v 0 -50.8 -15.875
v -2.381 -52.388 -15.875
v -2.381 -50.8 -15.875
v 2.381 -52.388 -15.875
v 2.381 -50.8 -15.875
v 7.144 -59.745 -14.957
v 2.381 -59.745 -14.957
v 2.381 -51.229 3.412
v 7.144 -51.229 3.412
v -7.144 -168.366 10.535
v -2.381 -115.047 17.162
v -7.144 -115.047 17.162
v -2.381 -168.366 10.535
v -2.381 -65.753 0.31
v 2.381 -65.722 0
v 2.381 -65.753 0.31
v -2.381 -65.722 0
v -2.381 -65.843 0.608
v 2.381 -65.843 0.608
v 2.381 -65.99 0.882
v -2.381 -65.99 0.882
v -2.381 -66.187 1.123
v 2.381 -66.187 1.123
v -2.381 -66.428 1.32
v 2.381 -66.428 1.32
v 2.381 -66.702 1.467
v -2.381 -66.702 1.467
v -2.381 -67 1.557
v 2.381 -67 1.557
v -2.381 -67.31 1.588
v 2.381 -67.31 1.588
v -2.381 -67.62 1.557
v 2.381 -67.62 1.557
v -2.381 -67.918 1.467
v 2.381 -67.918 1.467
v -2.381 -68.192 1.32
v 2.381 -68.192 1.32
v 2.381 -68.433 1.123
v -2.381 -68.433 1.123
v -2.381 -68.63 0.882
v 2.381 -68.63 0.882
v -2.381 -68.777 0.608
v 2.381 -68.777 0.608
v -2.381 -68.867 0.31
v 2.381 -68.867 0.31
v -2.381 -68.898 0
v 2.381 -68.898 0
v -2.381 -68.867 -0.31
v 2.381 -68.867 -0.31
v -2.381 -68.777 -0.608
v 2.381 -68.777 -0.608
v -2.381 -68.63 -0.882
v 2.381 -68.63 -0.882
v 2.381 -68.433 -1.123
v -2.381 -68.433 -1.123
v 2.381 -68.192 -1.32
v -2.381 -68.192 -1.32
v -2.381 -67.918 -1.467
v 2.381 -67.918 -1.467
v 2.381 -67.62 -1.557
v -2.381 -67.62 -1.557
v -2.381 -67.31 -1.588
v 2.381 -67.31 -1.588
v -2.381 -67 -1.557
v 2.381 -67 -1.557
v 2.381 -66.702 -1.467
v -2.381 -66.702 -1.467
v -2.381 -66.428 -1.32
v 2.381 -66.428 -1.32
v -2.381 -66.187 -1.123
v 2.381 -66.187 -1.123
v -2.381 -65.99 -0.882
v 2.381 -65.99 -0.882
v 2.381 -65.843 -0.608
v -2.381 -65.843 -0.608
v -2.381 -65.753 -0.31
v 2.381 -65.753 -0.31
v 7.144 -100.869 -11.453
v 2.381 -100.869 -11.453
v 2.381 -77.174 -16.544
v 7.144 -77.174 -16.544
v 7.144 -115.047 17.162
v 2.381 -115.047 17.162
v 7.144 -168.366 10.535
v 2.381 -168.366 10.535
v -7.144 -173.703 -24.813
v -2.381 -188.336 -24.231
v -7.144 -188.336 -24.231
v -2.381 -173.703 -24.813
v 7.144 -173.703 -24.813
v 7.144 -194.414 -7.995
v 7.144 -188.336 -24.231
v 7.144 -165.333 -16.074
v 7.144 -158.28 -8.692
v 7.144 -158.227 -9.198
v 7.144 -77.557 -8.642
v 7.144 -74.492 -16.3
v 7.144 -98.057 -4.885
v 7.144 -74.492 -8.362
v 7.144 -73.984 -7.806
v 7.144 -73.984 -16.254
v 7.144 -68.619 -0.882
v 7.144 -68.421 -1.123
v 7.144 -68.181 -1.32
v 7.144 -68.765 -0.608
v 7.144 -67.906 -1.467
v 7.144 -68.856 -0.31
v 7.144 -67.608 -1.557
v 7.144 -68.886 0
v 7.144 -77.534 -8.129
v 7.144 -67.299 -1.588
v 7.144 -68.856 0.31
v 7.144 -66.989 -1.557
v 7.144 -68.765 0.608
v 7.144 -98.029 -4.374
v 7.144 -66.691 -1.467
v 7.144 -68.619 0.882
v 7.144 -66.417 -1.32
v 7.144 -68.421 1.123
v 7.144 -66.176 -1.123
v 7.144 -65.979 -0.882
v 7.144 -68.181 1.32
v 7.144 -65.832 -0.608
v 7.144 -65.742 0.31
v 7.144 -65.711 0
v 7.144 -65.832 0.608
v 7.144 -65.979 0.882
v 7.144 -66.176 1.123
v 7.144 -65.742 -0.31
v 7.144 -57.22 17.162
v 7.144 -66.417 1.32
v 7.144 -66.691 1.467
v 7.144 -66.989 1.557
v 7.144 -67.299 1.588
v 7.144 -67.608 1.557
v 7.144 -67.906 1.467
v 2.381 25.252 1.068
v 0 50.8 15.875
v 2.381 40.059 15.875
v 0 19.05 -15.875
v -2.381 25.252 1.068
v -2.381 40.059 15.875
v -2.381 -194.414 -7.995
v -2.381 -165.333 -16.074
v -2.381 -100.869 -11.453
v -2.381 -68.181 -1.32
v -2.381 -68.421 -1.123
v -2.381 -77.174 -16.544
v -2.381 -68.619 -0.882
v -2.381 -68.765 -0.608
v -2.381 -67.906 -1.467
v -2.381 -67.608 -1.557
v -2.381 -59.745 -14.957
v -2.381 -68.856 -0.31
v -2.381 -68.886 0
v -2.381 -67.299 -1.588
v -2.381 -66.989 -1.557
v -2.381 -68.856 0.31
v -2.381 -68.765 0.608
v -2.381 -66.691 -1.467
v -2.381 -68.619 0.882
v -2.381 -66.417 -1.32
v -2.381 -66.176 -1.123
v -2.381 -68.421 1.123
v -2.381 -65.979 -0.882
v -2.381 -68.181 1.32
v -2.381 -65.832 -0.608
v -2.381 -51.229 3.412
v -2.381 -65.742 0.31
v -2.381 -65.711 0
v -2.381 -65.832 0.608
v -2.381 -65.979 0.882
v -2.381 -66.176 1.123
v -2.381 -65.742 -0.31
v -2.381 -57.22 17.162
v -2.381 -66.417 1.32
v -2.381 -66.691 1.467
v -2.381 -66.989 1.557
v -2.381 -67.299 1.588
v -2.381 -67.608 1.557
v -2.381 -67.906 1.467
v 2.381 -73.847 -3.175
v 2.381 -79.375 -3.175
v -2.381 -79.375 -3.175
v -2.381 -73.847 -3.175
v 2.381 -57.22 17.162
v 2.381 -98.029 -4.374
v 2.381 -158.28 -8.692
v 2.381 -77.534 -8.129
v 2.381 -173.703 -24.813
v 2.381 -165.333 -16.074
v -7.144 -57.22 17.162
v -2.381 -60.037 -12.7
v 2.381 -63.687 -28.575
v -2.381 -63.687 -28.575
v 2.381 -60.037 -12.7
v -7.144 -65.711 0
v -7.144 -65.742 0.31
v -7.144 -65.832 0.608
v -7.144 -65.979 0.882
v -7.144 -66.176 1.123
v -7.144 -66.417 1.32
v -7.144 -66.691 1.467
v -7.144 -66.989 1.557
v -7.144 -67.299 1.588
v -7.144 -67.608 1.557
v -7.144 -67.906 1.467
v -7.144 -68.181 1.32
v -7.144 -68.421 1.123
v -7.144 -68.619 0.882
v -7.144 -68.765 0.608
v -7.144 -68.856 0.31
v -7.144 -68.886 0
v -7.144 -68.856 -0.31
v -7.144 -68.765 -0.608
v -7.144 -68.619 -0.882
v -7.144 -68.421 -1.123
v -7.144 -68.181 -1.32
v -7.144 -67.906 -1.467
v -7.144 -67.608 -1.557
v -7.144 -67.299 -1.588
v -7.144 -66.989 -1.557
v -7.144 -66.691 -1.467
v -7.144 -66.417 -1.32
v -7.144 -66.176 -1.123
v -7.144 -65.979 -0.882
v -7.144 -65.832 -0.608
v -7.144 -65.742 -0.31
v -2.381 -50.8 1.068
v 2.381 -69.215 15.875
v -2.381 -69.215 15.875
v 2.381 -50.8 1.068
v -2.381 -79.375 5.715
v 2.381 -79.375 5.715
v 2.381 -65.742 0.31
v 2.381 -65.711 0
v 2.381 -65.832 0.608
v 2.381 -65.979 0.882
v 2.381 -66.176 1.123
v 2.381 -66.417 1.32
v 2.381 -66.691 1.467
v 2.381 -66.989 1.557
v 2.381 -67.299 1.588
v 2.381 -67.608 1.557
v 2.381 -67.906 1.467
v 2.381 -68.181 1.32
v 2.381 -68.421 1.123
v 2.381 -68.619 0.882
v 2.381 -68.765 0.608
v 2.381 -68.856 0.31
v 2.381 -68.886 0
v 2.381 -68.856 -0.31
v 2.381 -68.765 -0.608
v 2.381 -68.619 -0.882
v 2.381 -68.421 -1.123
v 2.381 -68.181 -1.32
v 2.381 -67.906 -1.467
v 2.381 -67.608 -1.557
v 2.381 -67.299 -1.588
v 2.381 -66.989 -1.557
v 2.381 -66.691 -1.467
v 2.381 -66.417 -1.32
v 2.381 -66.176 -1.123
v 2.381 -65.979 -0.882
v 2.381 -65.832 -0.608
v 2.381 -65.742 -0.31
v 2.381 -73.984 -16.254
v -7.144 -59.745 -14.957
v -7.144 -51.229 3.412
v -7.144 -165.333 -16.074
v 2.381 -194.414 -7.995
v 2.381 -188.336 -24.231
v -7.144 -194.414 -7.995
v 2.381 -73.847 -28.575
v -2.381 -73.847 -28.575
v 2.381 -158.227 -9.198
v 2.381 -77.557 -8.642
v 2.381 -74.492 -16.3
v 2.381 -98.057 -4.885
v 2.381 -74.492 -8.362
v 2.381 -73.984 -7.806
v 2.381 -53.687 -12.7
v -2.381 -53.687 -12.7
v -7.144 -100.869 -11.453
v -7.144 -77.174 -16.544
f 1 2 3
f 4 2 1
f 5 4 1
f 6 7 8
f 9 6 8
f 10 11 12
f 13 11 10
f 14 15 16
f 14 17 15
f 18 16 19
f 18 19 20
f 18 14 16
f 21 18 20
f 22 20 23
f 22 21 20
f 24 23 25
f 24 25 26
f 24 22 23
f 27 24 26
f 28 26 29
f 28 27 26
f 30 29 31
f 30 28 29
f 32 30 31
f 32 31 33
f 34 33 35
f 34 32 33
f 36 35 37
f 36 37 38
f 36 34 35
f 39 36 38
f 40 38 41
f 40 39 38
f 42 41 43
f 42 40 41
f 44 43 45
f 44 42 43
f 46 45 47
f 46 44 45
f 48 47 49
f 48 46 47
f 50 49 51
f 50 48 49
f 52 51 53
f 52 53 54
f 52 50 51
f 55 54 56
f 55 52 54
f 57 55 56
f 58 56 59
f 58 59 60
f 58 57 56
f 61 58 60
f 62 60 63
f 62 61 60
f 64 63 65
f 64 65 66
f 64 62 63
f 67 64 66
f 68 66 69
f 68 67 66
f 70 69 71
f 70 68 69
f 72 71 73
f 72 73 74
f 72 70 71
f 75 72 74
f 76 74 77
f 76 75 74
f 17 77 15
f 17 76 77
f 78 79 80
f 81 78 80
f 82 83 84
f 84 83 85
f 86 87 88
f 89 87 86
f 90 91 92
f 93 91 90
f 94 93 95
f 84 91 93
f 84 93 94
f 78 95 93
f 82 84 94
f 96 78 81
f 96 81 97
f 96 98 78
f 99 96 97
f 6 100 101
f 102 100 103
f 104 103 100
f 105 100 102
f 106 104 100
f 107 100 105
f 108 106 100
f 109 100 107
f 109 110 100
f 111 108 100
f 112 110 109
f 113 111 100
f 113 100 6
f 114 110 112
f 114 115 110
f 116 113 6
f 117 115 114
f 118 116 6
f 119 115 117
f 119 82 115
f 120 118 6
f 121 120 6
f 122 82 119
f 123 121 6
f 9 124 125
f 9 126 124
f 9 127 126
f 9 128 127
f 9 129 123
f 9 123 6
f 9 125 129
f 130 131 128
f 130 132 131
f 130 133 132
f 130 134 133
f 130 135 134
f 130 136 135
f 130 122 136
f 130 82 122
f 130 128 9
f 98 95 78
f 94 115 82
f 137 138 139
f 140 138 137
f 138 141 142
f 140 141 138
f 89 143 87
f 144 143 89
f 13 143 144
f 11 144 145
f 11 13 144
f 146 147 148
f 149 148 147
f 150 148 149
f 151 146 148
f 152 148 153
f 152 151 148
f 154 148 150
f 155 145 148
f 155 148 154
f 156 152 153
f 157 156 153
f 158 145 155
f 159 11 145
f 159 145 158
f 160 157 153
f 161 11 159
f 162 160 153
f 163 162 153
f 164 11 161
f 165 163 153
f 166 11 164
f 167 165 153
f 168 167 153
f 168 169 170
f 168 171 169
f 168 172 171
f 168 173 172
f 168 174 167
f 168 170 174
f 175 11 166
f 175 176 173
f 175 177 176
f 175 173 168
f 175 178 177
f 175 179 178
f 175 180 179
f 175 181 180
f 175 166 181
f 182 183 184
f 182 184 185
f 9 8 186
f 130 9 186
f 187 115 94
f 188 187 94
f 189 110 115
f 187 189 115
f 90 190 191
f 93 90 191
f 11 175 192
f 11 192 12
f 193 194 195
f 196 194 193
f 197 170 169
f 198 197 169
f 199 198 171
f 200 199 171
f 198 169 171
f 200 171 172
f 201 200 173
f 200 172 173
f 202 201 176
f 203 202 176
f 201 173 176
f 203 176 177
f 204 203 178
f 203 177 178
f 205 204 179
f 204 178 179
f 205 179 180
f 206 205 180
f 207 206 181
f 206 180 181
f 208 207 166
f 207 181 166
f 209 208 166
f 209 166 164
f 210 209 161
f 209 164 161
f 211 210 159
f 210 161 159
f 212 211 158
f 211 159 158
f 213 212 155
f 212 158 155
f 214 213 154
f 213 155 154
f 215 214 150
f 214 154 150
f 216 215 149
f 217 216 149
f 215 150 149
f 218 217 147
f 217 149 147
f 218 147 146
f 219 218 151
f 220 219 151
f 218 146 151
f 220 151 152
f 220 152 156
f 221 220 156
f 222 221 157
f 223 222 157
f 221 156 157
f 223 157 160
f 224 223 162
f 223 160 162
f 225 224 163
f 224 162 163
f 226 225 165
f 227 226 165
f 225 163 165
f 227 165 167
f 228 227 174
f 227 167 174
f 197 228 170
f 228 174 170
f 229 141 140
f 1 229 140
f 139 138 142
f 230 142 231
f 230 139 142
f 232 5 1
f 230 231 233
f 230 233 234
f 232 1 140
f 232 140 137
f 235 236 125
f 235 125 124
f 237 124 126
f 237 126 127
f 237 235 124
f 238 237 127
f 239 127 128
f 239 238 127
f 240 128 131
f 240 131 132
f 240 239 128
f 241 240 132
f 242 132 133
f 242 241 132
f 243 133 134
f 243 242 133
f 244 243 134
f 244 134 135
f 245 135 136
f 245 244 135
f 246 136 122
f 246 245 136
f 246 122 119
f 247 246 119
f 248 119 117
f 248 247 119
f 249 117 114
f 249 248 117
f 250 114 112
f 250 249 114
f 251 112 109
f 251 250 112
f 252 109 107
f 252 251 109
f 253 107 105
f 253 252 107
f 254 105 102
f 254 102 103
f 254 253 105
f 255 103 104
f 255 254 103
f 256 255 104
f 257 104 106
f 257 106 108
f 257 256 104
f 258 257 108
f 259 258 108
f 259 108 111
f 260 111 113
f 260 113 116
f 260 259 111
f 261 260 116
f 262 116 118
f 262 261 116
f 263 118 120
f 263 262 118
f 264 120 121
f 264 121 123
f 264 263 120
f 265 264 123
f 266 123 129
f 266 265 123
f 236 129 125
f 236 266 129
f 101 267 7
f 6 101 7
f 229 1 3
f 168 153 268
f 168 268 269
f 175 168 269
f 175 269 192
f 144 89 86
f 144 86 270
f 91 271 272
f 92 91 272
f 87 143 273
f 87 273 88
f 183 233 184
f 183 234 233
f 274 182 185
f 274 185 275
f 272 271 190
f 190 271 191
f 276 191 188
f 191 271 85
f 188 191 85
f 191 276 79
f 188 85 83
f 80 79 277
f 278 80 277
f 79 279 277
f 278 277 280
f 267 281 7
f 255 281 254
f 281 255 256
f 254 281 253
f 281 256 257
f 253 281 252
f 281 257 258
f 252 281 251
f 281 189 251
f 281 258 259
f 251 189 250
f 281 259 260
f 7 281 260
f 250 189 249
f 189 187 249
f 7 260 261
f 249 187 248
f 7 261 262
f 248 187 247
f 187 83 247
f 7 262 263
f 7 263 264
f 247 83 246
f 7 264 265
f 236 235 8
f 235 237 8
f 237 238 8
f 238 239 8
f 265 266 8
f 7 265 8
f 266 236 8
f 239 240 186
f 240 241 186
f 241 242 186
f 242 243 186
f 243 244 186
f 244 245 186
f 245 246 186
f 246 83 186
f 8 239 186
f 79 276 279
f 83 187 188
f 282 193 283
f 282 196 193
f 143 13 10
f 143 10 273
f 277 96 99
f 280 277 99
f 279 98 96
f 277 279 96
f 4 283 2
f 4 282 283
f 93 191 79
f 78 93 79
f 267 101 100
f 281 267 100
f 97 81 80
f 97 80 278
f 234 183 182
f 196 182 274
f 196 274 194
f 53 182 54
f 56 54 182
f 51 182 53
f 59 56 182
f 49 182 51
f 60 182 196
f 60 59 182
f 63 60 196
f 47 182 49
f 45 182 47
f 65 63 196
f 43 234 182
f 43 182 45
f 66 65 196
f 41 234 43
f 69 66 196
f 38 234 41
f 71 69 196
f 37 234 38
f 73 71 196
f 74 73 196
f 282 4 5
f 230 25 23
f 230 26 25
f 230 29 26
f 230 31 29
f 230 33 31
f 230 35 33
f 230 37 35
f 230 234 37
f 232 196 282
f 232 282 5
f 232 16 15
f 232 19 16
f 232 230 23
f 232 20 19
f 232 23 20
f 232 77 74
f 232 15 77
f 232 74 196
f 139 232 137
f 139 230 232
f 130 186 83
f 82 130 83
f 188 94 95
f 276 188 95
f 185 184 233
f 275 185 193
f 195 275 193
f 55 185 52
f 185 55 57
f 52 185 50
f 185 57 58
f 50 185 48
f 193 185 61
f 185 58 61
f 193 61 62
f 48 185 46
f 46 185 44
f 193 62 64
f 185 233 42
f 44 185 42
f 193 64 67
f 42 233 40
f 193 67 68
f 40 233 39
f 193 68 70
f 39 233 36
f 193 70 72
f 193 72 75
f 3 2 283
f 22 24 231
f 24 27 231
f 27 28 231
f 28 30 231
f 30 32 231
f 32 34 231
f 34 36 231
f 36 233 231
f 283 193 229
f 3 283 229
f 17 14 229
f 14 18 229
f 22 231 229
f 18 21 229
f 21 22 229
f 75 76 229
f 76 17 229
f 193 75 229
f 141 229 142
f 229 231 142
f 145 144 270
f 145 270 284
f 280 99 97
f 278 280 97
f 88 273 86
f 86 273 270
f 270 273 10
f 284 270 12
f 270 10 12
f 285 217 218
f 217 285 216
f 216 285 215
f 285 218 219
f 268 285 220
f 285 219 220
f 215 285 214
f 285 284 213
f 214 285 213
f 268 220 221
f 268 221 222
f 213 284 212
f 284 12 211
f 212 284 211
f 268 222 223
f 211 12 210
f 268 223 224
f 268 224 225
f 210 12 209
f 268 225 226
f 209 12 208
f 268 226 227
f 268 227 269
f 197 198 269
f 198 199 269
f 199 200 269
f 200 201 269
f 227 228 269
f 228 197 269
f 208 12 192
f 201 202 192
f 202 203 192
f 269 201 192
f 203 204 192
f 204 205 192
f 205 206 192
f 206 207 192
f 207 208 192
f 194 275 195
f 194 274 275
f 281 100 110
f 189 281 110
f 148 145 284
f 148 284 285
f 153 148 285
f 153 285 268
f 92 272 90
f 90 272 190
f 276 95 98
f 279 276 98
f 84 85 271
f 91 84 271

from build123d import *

# Parameters (mm, degrees)
F0_W      = 101.6
F0_H      = 31.75
F1_DEPTH  = 2.38125
F3_DEPTH  = 101.601
F7_R      = 1.5875
F8_DEPTH  = 2.38125
F9_SIZE   = 10.16
F11_R     = 1.5875
F12_DEPTH = 4.7625
F15_DEPTH = 4.7625


with BuildPart() as f1:
    # F0 (on Right) → F1 (new body, symmetric)
    with BuildSketch(Plane.YZ):
        Rectangle(F0_W, F0_H)
    extrude(amount=F1_DEPTH, both=True)

    # F2 (on face) → F3 (cut, through all)
    with BuildSketch(Plane(origin=(0, 50.8, 0), x_dir=(-1, 0, 0), z_dir=(0, 1, 0))):
        Polygon((2.38125, 1.0684741514), (0, -15.875), (-2.38125, 1.0684741514), (-18.4869468212, 1.0684741514), (-18.4869468212, -23.6229002476), (17.5397191197, -23.6229002476), (17.5397191197, 1.0684741514), align=None)
    extrude(amount=-F3_DEPTH, mode=Mode.SUBTRACT)

    # F6: sweep along a path in F4
    with BuildLine(Plane.YZ) as f6_path:
        Line((50.8, 15.875), (19.05, -15.875))
    # F5 (on face) → F6 (sweep, cut)
    with BuildSketch(Plane.XY.offset(15.875)):
        Polygon((-2.38125, 40.0588753757), (0, 50.8), (2.38125, 40.0588753757), (25.2857971936, 40.0588753757), (21.9698956102, 103.4185513854), (-23.8018085353, 103.4185513854), (-27.6726558805, 37.965990603), align=None)
    sweep(path=f6_path.line, mode=Mode.SUBTRACT)

    # F7 (on Right) → F8 (join, symmetric)
    with BuildSketch(Plane.YZ):
        Polygon((-52.3875, -15.875), (-50.8, -15.875), (-50.8, 15.875), (-79.375, 15.875), (-79.375, -3.175), (-73.8466912246, -3.175), (-73.8466912246, -28.575), (-63.6866912246, -28.575), (-60.0366964936, -12.7), (-53.6866964936, -12.7), align=None)
        with Locations((-67.31, 0)):
            Circle(F7_R, mode=Mode.SUBTRACT)
    extrude(amount=F8_DEPTH, both=True)

    # F9
    f9_edges = [f1.edges().sort_by_distance(p)[0] for p in [
        (0, -79.375, 15.875),
    ]]
    chamfer(f9_edges, length=F9_SIZE)


with BuildPart() as f12:
    # F11 (on face) → F12 (new body)
    with BuildSketch(Plane.YZ.offset(2.38125)):
        Polygon((-57.2196619652, 17.1623267233), (-115.0466650724, 17.1623267233), (-168.3660000563, 10.5353360996), (-194.4140195847, -7.995388296), (-188.3361786604, -24.2313144845), (-173.7032628157, -24.8130114187), (-165.3329879045, -16.0735603422), (-100.8694320917, -11.453111656), (-77.1741867065, -16.5441259742), (-59.7448249552, -14.9574161484), (-51.22936517, 3.4124411177), align=None)
        with Locations((-67.2986954451, 0)):
            Circle(F11_R, mode=Mode.SUBTRACT)
    extrude(amount=F12_DEPTH)


with BuildPart() as f13_1:
    # F13: instance of F12
    add(f12.part.mirror(Plane.YZ))


with BuildPart() as f12_1:
    add(f12.part)

    # F14 (on face) → F15 (cut, through all)
    with BuildSketch(Plane.YZ.offset(7.14375)):
        Polygon((-74.492054025, -8.3624537354), (-74.492054025, -16.2999537354), (-73.984054025, -16.2537071428), (-73.984054025, -7.8061064201), (-77.5342935257, -8.1293081517), (-98.0292251983, -4.3739453675), (-158.280459913, -8.6924744149), (-158.2270260661, -9.1979477418), (-98.0572913906, -4.8852602391), (-77.5574707394, -8.6415188492), align=None)
    extrude(amount=-F15_DEPTH, mode=Mode.SUBTRACT)


solid = Compound([f1.part, f13_1.part, f12_1.part])
